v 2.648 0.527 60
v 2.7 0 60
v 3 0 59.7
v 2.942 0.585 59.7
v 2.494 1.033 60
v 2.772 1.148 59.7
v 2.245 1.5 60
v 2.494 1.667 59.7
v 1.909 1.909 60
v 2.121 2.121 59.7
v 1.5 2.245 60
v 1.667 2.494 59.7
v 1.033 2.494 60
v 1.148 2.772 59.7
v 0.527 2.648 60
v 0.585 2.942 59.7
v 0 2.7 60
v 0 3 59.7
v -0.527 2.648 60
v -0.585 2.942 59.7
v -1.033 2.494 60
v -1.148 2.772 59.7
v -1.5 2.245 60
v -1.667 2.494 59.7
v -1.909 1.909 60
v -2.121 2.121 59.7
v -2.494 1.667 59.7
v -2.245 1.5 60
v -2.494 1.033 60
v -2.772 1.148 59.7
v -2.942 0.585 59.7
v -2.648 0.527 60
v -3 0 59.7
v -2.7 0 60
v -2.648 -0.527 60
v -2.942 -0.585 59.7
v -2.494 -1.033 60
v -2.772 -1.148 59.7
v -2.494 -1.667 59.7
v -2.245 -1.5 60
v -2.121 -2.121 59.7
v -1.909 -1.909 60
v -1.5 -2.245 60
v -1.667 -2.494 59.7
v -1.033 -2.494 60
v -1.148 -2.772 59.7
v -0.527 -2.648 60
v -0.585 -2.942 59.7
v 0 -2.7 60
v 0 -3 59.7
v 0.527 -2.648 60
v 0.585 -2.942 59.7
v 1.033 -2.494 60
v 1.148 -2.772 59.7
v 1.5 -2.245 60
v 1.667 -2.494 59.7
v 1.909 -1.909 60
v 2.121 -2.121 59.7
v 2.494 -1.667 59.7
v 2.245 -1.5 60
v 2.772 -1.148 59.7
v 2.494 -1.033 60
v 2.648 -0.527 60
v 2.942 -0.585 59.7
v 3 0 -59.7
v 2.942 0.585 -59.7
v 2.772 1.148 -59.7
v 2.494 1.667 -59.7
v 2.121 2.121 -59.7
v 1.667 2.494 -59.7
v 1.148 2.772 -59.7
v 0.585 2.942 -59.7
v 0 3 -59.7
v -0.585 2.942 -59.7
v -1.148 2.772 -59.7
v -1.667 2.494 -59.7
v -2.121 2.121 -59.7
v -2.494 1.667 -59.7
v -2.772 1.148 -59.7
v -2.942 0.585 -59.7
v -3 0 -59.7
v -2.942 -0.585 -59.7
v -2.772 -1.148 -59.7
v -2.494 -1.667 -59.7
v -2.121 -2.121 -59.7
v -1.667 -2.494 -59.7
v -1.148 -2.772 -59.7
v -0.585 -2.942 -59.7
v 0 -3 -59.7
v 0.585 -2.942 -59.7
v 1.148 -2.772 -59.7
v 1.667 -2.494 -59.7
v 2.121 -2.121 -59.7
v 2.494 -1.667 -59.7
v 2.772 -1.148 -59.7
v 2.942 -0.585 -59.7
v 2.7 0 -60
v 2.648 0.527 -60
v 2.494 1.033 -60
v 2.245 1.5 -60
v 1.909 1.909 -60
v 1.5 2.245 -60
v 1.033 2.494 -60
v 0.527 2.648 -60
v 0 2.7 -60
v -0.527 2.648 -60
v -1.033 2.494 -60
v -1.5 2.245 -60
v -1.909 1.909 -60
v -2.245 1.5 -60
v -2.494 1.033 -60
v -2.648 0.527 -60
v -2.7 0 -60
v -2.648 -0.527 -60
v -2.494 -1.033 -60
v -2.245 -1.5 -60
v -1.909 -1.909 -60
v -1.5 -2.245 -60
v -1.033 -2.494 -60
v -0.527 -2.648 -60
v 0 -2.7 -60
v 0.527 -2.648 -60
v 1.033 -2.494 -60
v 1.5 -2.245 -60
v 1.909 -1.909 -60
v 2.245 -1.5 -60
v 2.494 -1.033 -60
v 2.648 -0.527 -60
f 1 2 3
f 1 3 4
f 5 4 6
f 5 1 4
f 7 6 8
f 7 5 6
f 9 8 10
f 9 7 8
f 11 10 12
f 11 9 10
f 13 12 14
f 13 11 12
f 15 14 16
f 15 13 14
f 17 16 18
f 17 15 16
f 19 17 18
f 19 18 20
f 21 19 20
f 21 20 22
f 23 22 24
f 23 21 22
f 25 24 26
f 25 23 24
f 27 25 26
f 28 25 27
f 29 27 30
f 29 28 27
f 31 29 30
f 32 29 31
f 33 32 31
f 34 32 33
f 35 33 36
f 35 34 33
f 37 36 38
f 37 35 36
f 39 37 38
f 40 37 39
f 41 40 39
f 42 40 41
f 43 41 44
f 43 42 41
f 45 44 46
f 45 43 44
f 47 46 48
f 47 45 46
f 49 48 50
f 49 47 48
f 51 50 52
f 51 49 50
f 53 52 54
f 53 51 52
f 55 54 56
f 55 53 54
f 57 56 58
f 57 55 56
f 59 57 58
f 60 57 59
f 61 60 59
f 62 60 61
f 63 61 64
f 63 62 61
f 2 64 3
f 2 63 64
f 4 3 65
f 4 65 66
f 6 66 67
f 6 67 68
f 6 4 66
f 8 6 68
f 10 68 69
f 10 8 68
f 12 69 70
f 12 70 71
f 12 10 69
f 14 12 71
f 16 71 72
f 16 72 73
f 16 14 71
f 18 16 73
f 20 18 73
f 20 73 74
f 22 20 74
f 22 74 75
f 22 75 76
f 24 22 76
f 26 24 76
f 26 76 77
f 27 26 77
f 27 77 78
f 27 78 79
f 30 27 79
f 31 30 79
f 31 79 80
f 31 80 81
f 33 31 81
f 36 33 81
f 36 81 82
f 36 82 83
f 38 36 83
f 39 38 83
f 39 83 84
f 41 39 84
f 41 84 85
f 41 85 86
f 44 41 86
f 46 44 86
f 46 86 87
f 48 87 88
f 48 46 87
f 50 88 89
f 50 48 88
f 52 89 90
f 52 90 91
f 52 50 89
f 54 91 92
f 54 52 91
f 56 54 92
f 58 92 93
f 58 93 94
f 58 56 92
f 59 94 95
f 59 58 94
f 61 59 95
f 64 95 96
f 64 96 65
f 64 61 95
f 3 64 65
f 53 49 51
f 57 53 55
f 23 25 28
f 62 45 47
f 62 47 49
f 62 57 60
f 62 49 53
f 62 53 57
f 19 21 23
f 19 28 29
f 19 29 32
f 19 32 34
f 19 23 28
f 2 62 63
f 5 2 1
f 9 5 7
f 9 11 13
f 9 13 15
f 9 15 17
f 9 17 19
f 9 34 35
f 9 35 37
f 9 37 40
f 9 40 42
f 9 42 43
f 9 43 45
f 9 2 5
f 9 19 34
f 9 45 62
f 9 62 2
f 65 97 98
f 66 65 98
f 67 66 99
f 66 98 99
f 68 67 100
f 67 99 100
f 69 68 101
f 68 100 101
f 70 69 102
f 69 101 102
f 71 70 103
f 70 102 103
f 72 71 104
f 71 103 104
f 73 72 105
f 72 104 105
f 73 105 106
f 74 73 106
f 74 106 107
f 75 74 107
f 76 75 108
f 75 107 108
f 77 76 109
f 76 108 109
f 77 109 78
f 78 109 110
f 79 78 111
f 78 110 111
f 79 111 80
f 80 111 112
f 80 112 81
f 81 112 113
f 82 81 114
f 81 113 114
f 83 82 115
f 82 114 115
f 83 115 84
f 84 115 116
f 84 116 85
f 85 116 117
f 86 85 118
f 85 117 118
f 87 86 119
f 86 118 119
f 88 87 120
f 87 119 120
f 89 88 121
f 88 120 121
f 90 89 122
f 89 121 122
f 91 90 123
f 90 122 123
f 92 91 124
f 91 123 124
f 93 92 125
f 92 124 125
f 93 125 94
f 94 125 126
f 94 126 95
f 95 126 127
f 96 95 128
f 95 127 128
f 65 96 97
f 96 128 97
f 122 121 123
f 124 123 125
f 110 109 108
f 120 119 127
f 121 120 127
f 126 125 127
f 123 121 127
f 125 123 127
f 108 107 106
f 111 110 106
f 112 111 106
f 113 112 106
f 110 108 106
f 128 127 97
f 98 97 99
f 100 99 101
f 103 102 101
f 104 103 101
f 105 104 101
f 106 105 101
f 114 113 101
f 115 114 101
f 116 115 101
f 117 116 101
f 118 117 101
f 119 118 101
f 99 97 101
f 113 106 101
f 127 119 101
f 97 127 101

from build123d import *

# Parameters (mm, degrees)
SKETCH_1_R      = 3
EXTRUDE_1_DEPTH = 60
CHAMFER_1_SIZE  = 0.3
CHAMFER_2_SIZE  = 0.3


with BuildPart() as part:
    # 草图1 → 凸台-拉伸1 (new, symmetric)
    with BuildSketch(Plane.XY):
        Circle(SKETCH_1_R)
    extrude(amount=EXTRUDE_1_DEPTH, both=True)

    # 倒角1
    chamfer_1_edges = [part.edges().sort_by_distance(p)[0] for p in [
        (-3, 0, 60),
    ]]
    chamfer(chamfer_1_edges, length=CHAMFER_1_SIZE)

    # 倒角2
    chamfer_2_edges = [part.edges().sort_by_distance(p)[0] for p in [
        (-3, 0, -60),
    ]]
    chamfer(chamfer_2_edges, length=CHAMFER_2_SIZE)


solid = part.part
